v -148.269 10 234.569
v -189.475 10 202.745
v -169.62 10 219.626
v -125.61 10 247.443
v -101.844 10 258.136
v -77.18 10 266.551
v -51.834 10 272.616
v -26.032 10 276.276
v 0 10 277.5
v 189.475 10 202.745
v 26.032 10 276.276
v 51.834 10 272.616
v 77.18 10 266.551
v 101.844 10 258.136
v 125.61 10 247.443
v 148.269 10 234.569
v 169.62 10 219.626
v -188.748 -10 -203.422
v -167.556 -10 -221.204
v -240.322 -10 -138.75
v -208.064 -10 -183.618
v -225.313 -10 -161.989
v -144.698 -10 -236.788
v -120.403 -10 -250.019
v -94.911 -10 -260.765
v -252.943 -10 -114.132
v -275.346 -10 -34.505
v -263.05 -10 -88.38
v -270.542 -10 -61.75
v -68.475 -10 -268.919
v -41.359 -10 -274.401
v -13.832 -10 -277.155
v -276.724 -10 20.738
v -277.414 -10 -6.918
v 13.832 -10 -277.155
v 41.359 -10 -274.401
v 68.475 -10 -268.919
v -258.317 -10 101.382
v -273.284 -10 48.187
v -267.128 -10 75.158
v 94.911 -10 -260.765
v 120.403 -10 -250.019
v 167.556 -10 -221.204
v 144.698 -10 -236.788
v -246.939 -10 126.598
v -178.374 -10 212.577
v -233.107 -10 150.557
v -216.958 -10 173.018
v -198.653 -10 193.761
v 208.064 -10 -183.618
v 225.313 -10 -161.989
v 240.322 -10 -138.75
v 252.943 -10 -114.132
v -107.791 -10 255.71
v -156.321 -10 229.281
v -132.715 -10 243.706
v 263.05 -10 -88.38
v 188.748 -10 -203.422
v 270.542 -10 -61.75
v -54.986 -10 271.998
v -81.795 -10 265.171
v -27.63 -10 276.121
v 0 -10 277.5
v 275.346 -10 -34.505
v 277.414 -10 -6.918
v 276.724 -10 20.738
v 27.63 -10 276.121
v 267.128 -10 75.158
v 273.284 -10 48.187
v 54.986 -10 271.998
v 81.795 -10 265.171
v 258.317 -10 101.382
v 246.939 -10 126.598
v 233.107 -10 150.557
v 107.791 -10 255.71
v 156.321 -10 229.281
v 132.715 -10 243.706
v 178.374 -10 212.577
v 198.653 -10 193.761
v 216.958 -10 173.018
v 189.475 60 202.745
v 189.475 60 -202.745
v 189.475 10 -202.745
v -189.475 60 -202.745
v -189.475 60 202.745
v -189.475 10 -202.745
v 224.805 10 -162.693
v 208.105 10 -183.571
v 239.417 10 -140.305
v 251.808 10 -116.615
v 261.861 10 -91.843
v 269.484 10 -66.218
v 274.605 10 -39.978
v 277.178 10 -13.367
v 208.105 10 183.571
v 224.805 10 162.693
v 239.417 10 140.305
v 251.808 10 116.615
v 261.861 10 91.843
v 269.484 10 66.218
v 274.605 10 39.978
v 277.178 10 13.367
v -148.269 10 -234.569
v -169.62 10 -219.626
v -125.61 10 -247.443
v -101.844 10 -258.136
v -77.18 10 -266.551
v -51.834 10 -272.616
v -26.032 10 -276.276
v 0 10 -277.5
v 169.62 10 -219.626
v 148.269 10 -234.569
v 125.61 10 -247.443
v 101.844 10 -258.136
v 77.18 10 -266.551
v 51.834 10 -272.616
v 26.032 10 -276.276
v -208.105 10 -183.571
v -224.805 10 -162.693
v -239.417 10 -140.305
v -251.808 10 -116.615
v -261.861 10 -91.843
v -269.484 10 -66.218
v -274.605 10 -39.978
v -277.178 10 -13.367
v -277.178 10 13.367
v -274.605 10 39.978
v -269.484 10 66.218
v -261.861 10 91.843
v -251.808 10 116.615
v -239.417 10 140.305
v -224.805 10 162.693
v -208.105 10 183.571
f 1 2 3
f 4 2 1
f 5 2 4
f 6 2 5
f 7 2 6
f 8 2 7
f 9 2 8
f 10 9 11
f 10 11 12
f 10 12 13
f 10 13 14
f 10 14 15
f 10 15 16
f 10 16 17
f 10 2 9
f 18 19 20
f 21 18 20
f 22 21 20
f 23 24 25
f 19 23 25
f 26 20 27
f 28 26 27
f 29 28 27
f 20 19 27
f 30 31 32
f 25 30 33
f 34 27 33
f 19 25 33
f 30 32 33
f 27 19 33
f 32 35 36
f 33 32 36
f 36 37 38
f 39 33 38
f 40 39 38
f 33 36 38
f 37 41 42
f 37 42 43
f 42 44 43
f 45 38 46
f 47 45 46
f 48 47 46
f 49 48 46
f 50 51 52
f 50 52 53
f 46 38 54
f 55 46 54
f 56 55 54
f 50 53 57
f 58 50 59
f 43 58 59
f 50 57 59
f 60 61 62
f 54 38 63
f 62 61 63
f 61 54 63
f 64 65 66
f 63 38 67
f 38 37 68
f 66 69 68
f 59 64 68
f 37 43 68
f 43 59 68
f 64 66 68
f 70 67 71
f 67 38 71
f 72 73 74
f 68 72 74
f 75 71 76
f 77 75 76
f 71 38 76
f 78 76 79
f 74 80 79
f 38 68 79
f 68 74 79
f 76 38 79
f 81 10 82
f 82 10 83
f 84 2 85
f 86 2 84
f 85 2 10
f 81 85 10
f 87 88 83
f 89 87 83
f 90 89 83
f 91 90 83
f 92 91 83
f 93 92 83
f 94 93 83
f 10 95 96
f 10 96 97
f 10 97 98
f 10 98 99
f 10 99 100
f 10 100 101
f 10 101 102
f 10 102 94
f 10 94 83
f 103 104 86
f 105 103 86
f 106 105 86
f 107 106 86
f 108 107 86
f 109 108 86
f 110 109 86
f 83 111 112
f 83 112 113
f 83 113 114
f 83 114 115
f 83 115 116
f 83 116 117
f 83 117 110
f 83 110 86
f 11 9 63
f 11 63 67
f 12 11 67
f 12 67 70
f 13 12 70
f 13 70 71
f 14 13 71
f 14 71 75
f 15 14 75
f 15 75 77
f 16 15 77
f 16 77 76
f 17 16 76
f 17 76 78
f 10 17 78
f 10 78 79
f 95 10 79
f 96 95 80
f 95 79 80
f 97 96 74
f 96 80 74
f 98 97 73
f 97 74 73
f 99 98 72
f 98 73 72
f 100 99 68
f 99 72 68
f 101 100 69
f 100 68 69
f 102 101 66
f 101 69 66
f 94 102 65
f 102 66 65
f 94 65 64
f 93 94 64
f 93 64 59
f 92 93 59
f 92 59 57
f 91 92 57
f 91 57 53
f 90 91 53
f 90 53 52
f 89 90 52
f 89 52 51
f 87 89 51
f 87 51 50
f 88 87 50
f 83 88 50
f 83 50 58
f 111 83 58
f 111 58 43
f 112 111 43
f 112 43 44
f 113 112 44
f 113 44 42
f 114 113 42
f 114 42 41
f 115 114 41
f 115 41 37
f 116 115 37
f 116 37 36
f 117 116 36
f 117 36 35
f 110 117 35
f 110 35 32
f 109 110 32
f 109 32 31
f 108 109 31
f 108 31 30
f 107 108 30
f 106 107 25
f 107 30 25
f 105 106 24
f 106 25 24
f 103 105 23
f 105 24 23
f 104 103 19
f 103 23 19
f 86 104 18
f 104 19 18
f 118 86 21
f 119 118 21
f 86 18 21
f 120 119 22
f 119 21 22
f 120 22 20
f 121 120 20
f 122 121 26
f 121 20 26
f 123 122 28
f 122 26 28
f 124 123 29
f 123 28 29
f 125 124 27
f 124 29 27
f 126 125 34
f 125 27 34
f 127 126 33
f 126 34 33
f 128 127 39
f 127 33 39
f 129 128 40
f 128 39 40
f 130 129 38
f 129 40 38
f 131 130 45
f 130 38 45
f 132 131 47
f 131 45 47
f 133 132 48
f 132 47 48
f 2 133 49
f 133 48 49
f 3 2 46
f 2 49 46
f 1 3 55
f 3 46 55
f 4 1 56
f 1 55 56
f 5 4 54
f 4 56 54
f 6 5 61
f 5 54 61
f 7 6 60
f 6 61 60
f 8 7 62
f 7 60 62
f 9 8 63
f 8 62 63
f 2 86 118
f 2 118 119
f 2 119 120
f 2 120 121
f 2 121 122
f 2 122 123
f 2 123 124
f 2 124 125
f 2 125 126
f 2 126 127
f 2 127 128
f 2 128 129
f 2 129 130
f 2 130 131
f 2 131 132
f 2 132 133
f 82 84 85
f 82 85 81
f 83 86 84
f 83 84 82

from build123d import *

# Parameters (mm, degrees)
BOSS_EXTRUDE1_DEPTH      = 10
BOSS_EXTRUDE1_DEPTH_BACK = 10
SKETCH1_R                = 277.5
SKETCH2_W                = 378.949229626
SKETCH2_H                = 405.490420806
BOSS_EXTRUDE2_DEPTH      = 50


with BuildPart() as part:
    # Sketch1 → Boss-Extrude1 (new, two sides: drawn at the far end of the back side and taken through both)
    with BuildSketch(Plane(origin=(0, 0, 0), x_dir=(1, 0, 0), z_dir=(0, 1, 0)).offset(-BOSS_EXTRUDE1_DEPTH_BACK)):
        Circle(SKETCH1_R)
    extrude(amount=BOSS_EXTRUDE1_DEPTH + BOSS_EXTRUDE1_DEPTH_BACK)

    # Sketch2 → Boss-Extrude2 (add)
    with BuildSketch(Plane(origin=(0, 10, 0), x_dir=(1, 0, 0), z_dir=(0, 1, 0))):
        Rectangle(SKETCH2_W, SKETCH2_H)
    extrude(amount=BOSS_EXTRUDE2_DEPTH)


solid = part.part
